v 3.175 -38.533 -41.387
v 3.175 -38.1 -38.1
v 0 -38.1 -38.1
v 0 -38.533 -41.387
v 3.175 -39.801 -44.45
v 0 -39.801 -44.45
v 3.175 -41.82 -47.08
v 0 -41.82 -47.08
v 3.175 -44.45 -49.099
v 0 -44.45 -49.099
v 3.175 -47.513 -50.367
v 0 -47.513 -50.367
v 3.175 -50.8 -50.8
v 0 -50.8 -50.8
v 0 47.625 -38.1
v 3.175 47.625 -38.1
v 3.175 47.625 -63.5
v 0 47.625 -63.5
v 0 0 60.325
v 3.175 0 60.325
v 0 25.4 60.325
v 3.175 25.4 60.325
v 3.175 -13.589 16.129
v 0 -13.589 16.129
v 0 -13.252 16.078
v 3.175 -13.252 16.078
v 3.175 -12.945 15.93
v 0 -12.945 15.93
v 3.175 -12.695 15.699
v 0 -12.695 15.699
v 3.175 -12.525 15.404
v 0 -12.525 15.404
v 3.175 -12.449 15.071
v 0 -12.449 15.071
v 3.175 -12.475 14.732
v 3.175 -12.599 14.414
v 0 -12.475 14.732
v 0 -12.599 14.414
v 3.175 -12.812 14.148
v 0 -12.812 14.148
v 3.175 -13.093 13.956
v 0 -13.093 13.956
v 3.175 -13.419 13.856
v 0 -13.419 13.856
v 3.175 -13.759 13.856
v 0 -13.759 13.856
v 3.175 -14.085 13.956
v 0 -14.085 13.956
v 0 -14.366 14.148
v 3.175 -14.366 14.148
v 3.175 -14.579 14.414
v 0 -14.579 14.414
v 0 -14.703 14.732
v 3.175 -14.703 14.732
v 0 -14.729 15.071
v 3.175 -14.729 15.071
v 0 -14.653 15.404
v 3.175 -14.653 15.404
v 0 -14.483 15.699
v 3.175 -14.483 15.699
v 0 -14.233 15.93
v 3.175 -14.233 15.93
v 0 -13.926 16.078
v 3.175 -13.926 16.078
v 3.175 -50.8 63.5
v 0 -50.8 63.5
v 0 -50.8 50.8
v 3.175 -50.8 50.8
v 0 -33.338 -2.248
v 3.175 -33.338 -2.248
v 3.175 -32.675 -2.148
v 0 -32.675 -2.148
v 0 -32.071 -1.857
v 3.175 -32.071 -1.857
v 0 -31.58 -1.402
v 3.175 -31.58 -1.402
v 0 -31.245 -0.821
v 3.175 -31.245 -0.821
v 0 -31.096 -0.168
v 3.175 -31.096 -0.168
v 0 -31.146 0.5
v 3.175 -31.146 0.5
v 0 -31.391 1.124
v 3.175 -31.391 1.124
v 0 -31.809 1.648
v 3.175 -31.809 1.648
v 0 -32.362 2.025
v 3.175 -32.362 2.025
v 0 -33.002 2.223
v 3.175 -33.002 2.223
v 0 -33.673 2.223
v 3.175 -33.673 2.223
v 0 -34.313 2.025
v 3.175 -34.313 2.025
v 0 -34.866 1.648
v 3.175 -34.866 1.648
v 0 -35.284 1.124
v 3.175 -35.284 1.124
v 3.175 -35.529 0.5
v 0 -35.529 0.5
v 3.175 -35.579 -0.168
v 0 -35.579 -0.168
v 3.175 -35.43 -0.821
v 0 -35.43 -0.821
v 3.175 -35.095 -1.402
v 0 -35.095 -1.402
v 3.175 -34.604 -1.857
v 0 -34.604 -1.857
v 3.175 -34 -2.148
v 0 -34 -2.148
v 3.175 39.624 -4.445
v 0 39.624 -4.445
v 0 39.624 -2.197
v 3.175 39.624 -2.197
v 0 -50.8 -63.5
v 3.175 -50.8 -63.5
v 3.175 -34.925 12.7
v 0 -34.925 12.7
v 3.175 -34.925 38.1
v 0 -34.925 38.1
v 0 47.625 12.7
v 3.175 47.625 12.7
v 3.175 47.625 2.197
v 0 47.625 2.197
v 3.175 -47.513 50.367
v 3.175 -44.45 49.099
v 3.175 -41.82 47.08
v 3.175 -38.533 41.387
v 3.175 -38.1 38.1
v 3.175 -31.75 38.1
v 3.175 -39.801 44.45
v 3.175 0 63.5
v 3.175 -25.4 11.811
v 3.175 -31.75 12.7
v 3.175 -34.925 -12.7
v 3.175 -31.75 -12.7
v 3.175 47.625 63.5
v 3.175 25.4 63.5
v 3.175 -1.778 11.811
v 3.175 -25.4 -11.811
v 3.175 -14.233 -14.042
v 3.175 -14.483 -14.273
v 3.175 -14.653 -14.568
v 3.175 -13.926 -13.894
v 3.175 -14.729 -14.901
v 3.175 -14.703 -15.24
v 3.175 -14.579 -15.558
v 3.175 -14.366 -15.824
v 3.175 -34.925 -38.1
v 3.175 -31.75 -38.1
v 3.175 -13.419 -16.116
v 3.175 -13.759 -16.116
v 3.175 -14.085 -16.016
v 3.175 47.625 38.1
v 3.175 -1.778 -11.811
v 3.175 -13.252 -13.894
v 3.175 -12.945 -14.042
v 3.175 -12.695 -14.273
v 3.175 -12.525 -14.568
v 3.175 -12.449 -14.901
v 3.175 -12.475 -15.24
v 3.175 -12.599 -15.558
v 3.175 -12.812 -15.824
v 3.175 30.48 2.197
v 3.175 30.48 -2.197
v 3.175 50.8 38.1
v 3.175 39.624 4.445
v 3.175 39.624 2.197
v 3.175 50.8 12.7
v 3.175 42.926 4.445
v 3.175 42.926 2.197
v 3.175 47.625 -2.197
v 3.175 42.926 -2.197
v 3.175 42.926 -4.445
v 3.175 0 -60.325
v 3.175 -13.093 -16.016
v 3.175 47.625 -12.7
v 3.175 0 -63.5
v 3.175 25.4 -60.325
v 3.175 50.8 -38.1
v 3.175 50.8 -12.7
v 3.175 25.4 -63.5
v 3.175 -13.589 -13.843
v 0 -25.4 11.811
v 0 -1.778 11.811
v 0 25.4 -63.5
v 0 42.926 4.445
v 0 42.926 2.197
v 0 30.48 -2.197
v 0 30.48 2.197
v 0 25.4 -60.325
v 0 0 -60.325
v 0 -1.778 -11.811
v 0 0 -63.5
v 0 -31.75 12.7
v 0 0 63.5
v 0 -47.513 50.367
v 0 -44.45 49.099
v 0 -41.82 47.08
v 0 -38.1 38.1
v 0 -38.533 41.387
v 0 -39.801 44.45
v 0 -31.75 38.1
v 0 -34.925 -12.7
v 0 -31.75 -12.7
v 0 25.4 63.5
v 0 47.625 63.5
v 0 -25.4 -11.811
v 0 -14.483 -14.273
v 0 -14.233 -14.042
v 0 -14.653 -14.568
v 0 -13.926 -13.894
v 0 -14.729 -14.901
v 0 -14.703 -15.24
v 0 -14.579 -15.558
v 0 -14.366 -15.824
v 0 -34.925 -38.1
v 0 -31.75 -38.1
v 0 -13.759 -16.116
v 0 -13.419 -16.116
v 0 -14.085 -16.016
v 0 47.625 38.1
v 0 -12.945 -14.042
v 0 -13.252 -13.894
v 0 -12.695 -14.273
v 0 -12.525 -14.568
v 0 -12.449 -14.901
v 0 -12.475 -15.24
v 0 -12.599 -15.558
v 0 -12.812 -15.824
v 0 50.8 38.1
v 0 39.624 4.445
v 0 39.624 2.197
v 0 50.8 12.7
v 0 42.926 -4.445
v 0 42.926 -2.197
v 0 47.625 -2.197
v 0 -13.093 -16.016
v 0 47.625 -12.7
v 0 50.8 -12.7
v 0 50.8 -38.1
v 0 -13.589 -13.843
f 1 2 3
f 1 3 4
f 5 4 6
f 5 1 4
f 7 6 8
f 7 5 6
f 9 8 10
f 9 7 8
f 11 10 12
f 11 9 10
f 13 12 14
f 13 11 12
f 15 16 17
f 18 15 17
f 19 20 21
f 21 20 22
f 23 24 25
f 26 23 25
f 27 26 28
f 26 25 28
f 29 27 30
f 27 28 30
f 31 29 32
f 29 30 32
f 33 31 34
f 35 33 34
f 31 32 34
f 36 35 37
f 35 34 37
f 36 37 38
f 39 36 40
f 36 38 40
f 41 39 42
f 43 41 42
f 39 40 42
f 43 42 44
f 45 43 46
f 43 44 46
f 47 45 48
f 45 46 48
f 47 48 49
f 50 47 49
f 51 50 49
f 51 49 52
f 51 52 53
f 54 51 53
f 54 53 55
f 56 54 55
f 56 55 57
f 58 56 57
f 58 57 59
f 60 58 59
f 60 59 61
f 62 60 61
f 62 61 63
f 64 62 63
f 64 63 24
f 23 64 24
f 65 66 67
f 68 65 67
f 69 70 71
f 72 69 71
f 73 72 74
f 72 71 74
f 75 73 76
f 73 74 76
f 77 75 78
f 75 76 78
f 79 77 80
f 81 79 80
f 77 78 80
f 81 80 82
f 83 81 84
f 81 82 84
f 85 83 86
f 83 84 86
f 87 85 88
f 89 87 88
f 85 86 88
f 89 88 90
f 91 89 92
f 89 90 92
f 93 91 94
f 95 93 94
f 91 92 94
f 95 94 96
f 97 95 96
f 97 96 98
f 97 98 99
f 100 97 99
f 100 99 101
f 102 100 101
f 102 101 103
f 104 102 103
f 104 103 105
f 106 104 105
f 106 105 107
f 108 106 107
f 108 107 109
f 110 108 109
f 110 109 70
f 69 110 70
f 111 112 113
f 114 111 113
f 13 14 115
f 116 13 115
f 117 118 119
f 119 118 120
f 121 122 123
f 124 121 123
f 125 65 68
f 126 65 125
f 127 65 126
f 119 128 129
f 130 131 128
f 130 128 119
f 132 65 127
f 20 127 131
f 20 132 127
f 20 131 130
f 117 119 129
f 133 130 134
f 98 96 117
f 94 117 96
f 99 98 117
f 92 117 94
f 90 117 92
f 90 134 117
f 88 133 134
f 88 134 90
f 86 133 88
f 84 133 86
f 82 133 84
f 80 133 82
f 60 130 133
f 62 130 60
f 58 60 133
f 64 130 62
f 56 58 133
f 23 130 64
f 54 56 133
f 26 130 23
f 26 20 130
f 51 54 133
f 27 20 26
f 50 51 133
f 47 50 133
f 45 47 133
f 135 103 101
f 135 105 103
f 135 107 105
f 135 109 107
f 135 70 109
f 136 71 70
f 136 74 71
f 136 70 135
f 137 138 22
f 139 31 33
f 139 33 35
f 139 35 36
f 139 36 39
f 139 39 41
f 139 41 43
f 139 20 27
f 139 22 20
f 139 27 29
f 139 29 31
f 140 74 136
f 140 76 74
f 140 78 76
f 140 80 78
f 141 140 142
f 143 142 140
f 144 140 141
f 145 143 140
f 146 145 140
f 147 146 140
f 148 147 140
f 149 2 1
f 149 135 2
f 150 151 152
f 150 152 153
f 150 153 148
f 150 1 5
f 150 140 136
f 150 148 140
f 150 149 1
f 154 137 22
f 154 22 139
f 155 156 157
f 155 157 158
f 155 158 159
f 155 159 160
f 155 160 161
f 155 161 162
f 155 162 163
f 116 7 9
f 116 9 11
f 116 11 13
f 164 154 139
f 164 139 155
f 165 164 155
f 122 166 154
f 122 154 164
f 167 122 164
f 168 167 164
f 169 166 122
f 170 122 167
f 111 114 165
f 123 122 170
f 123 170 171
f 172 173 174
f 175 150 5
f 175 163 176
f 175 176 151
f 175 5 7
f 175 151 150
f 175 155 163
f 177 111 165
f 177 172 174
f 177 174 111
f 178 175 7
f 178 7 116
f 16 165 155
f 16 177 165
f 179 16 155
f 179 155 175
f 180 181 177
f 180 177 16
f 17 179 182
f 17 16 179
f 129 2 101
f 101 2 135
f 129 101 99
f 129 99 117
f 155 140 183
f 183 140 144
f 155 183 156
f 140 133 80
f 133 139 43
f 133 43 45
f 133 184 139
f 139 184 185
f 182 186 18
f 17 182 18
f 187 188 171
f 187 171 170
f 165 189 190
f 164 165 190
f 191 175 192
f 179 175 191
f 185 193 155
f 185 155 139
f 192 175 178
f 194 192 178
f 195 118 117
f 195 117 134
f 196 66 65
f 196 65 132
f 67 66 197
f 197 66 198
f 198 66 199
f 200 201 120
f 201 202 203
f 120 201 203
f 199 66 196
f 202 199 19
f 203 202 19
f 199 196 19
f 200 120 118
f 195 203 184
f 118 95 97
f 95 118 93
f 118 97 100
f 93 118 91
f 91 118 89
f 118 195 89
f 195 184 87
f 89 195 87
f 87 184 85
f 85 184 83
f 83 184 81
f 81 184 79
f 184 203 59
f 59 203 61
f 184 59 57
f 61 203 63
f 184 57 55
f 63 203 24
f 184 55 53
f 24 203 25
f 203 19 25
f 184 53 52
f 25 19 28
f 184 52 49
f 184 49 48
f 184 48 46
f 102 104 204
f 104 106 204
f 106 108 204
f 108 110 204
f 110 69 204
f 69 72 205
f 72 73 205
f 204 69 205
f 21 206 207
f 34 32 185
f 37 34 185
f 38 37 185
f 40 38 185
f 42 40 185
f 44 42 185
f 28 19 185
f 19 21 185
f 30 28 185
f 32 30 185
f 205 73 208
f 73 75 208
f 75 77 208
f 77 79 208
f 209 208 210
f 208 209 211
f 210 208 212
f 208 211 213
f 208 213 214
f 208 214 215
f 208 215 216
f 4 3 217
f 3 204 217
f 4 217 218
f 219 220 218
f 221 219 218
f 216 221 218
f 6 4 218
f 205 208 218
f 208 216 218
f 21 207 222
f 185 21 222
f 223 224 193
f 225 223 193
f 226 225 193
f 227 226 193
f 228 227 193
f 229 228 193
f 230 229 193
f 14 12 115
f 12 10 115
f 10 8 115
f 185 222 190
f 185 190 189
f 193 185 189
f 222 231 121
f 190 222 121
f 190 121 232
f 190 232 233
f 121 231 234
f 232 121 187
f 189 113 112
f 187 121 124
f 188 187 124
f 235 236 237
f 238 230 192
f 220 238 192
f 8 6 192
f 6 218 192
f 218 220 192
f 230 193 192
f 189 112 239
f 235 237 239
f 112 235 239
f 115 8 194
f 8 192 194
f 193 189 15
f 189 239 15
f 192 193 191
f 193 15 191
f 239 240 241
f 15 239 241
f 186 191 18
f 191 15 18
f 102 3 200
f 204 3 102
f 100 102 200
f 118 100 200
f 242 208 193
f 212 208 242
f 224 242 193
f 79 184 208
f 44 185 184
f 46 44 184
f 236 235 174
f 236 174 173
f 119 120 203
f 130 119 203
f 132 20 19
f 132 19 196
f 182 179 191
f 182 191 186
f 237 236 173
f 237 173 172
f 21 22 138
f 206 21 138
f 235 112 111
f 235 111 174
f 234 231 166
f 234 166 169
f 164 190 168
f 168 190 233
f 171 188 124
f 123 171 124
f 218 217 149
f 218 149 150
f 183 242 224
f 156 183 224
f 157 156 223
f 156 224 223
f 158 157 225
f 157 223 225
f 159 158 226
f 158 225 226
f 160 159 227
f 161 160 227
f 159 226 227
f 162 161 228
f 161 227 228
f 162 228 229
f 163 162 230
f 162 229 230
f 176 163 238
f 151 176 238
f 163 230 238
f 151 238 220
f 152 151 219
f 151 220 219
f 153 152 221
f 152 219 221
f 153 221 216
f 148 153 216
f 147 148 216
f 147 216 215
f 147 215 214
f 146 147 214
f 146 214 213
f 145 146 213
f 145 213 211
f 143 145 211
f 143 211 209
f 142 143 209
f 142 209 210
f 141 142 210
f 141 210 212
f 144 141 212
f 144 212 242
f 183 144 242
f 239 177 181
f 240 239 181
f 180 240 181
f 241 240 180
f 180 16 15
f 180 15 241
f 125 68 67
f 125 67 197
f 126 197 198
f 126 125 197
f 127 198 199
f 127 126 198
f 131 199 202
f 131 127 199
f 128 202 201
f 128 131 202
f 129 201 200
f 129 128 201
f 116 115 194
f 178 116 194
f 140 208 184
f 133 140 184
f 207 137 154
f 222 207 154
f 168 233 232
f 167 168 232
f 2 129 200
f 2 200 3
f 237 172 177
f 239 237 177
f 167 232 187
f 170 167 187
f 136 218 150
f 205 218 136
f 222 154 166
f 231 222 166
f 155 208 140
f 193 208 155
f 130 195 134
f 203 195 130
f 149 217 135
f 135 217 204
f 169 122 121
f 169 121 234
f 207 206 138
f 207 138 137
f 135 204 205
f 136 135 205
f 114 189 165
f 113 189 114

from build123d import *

# Parameters (mm, degrees)
SKETCH1_W                 = 127
SKETCH1_H                 = 101.6
BOSS_EXTRUDE1_DEPTH       = 3.175
SKETCH2_W                 = 25.4
SKETCH2_H                 = 3.175
CUT_EXTRUDE1_DEPTH        = 6.35
LPATTERN1_COUNT           = 3
LPATTERN1_PITCH           = 50.8
CUT_EXTRUDE4_DEPTH        = 6.35
SKETCH8_W                 = 3.175
SKETCH8_H                 = 25.4
CUT_EXTRUDE6_DEPTH        = 6.35
SKETCH9_W                 = 25.4
SKETCH9_H                 = 3.175
CUT_EXTRUDE7_DEPTH        = 6.35
LPATTERN6_COUNT           = 2
LPATTERN6_PITCH           = 50.8
SKETCH16_W                = 4.3942
SKETCH16_H                = 17.145
SKETCH16_W_2              = 8.89
SKETCH16_H_2              = 3.302
CUT_EXTRUDE14_DEPTH       = 6.35
F_8_CLEARANCE_HOLE1_D     = 4.4958
F_8_CLEARANCE_HOLE1_DEPTH = 10.16
F_8_CLEARANCE_HOLE1_TIP   = 1.350674586
SKETCH20_R                = 1.143
SKETCH20_W                = 23.622
SKETCH20_H                = 23.622
CUT_EXTRUDE16_DEPTH       = 10.16


with BuildPart() as part:
    # Sketch1 → Boss-Extrude1 (new body)
    with BuildSketch(Plane(origin=(0, 0, 0), x_dir=(0, 0, -1), z_dir=(1, 0, 0))):
        Rectangle(SKETCH1_W, SKETCH1_H)
    extrude(amount=BOSS_EXTRUDE1_DEPTH)

    # Sketch2 → Cut-Extrude1 (cut)
    with BuildSketch(Plane(origin=(3.175, 0, 0), x_dir=(0, 0, -1), z_dir=(1, 0, 0))):
        with Locations((-50.8, 49.2125)):
            Rectangle(SKETCH2_W, SKETCH2_H)
    cut_extrude1 = extrude(amount=-CUT_EXTRUDE1_DEPTH, mode=Mode.SUBTRACT)

    # LPattern1: Cut-Extrude1 ×3
    with Locations(*[(0, 0, -i * LPATTERN1_PITCH) for i in range(1, LPATTERN1_COUNT)]):
        add(cut_extrude1, mode=Mode.SUBTRACT)

    # Sketch5 → Cut-Extrude4 (cut)
    with BuildSketch(Plane(origin=(3.175, 0, 0), x_dir=(0, 0, -1), z_dir=(1, 0, 0))):
        with BuildLine():
            Line((-38.1, -38.1), (38.1, -38.1))
            ThreePointArc((38.1, -38.1), (50.8, -50.8), (38.1, -63.5))
            Line((38.1, -63.5), (-38.1, -63.5))
            ThreePointArc((-38.1, -63.5), (-50.8, -50.8), (-38.1, -38.1))
        make_face()
    extrude(amount=-CUT_EXTRUDE4_DEPTH, mode=Mode.SUBTRACT)

    # Sketch8 → Cut-Extrude6 (cut)
    with BuildSketch(Plane(origin=(3.175, 0, 0), x_dir=(0, 0, -1), z_dir=(1, 0, 0))):
        with Locations((61.9125, 12.7)):
            Rectangle(SKETCH8_W, SKETCH8_H)
    cut_extrude6 = extrude(amount=-CUT_EXTRUDE6_DEPTH, mode=Mode.SUBTRACT)

    # Sketch9 → Cut-Extrude7 (cut)
    with BuildSketch(Plane.ZY):
        with Locations((-25.4, -33.3375)):
            Rectangle(SKETCH9_W, SKETCH9_H)
    cut_extrude7 = extrude(amount=-CUT_EXTRUDE7_DEPTH, mode=Mode.SUBTRACT)

    # LPattern6: Cut-Extrude7 ×2
    with Locations(*[(0, 0, i * LPATTERN6_PITCH) for i in range(1, LPATTERN6_COUNT)]):
        add(cut_extrude7, mode=Mode.SUBTRACT)

    # Sketch16 → Cut-Extrude14 (cut)
    with BuildSketch(Plane.ZY):
        with Locations((0, 39.0525)):
            Rectangle(SKETCH16_W, SKETCH16_H)
        with Locations((0, 41.275)):
            Rectangle(SKETCH16_W_2, SKETCH16_H_2)
    extrude(amount=-CUT_EXTRUDE14_DEPTH, mode=Mode.SUBTRACT)

    # #8 Clearance Hole1
    with Locations(Plane.ZY):
        with Locations((0, -33.3375)):
            Hole(F_8_CLEARANCE_HOLE1_D / 2, depth=F_8_CLEARANCE_HOLE1_DEPTH)
            with Locations((0, 0, -(F_8_CLEARANCE_HOLE1_DEPTH + F_8_CLEARANCE_HOLE1_TIP / 2))):  # 118° drill point
                Cone(0, F_8_CLEARANCE_HOLE1_D / 2, F_8_CLEARANCE_HOLE1_TIP, mode=Mode.SUBTRACT)

    # Sketch20 → Cut-Extrude16 (cut)
    with BuildSketch(Plane.ZY):
        with Locations((-14.986, -13.589)):
            Circle(SKETCH20_R)
        with Locations((14.986, -13.589)):
            Circle(SKETCH20_R)
        with Locations((0, -13.589)):
            Rectangle(SKETCH20_W, SKETCH20_H)
    extrude(amount=-CUT_EXTRUDE16_DEPTH, mode=Mode.SUBTRACT)

    # Mirror3: Cut-Extrude6 across plane
    add(cut_extrude6.mirror(Plane.XY), mode=Mode.SUBTRACT)


solid = part.part
